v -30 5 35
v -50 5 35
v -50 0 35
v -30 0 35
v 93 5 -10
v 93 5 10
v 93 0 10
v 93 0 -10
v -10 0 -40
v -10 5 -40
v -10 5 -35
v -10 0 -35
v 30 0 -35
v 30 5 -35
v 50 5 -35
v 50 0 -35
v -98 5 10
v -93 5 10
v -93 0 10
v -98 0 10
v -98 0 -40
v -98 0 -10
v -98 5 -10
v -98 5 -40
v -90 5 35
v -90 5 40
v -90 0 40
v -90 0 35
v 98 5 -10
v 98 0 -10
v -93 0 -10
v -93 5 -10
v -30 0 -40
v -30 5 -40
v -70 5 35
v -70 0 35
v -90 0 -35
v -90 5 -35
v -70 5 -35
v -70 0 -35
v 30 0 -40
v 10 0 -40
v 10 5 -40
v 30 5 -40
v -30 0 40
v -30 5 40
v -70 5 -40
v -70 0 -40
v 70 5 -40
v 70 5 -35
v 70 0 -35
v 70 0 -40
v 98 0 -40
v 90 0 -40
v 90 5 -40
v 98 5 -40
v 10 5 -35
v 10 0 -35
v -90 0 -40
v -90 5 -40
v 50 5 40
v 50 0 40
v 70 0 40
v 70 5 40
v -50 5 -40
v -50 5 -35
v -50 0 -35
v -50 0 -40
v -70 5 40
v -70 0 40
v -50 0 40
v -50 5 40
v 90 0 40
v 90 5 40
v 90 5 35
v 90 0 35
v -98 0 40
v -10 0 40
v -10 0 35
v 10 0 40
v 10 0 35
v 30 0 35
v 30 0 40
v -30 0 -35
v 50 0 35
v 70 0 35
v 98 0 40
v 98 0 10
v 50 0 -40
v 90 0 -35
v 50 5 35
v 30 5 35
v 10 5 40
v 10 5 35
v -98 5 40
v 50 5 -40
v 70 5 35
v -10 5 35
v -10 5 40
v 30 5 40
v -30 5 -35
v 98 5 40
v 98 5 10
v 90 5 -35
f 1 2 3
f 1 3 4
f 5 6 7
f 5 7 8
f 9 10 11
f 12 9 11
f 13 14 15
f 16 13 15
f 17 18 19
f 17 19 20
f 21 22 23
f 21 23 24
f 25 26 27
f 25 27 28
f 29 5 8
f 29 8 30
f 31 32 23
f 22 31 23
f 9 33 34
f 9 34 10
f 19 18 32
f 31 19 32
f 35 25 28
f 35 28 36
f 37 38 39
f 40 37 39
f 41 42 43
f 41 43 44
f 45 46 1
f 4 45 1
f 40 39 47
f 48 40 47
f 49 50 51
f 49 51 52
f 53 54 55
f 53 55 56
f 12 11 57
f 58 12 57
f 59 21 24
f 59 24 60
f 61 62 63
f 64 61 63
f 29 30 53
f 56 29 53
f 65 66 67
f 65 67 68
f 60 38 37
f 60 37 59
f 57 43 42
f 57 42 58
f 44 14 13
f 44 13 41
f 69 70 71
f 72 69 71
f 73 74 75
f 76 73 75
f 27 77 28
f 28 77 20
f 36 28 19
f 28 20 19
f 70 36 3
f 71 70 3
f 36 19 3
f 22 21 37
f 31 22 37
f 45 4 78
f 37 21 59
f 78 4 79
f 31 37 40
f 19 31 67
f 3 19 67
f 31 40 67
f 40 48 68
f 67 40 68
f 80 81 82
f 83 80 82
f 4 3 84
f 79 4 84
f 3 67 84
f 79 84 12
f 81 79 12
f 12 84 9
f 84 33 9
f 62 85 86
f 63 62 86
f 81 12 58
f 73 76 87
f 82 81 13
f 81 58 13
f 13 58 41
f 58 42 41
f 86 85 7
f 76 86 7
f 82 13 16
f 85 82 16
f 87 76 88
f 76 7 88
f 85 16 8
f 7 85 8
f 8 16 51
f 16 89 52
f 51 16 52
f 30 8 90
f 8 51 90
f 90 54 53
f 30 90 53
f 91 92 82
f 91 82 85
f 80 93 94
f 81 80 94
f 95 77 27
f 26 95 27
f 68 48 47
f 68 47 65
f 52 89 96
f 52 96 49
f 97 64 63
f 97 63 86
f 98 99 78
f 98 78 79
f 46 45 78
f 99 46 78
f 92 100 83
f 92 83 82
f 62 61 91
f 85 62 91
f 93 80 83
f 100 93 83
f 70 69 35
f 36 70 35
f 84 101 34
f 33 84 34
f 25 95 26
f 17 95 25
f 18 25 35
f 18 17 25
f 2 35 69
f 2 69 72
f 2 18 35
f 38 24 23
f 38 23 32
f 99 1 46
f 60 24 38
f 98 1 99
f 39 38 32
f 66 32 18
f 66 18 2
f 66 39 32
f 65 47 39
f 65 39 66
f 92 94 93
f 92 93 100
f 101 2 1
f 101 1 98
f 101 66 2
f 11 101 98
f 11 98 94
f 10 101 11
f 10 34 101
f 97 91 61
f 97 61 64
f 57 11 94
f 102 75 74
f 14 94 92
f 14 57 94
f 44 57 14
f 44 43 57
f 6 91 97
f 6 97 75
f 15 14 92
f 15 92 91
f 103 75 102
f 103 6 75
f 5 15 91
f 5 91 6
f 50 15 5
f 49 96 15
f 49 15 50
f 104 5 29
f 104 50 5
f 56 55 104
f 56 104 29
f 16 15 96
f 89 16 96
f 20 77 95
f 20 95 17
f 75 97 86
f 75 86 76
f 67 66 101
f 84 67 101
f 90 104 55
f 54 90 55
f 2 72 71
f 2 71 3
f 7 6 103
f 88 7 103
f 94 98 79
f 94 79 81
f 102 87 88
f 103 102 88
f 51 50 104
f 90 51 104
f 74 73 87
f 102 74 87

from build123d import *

# Parameters (mm, degrees)
SKETCH_1_W               = 196
SKETCH_1_H               = 80
EXTRUDE_1_DEPTH          = 5
CUT_EXTRUDE_1_REACH      = 107.967
SKETCH_2_W               = 20
SKETCH_2_H               = 5
PATTERN_LINEAR_1_COUNT   = 3
PATTERN_LINEAR_1_PITCH   = 40
PATTERN_LINEAR_2_COUNT   = 3
PATTERN_LINEAR_2_PITCH   = 40
CUT_EXTRUDE_2_REACH      = 107.967
SKETCH_3_W               = 5
SKETCH_3_H               = 20
MIRROR_2_COPY_1_REACH    = 107.967
MIRROR_2_COPY_1_SKETCH_W = 20
MIRROR_2_COPY_1_SKETCH_H = 5
MIRROR_2_COPY_2_REACH    = 107.967
MIRROR_2_COPY_2_SKETCH_W = 20
MIRROR_2_COPY_2_SKETCH_H = 5
MIRROR_2_COPY_3_REACH    = 107.967
MIRROR_2_COPY_3_SKETCH_W = 20
MIRROR_2_COPY_3_SKETCH_H = 5
MIRROR_2_COPY_4_REACH    = 107.967
MIRROR_2_COPY_4_SKETCH_W = 20
MIRROR_2_COPY_4_SKETCH_H = 5


with BuildPart() as part:
    # 스케치1 → 보스-돌출1 (new body)
    with BuildSketch(Plane(origin=(0, 0, 0), x_dir=(1, 0, 0), z_dir=(0, 1, 0))):
        Rectangle(SKETCH_1_W, SKETCH_1_H)
    extrude(amount=EXTRUDE_1_DEPTH)

    # 스케치2 → 컷-돌출1 (cut, up to next)
    with BuildSketch(Plane(origin=(0, 5, 0), x_dir=(1, 0, 0), z_dir=(0, 1, 0)), mode=Mode.PRIVATE) as cut_extrude_1_sk1:
        with Locations((0, -37.5)):
            Rectangle(SKETCH_2_W, SKETCH_2_H)
    cut_extrude_1_tool1 = extrude(cut_extrude_1_sk1.sketch, amount=-CUT_EXTRUDE_1_REACH, mode=Mode.PRIVATE) & part.part
    cut_extrude_1 = cut_extrude_1_tool1.solids().sort_by_distance((0, 5, 37.5))[0]
    add(cut_extrude_1, mode=Mode.SUBTRACT)

    # 선형 패턴1: 컷-돌출1 ×3
    with Locations(*[(i * PATTERN_LINEAR_1_PITCH, 0, 0) for i in range(1, PATTERN_LINEAR_1_COUNT)]):
        add(cut_extrude_1, mode=Mode.SUBTRACT)

    # 선형 패턴2: 컷-돌출1 ×3
    with Locations(*[(-i * PATTERN_LINEAR_2_PITCH, 0, 0) for i in range(1, PATTERN_LINEAR_2_COUNT)]):
        add(cut_extrude_1, mode=Mode.SUBTRACT)

    # 스케치3 → 컷-돌출2 (cut, up to next)
    with BuildSketch(Plane(origin=(0, 5, 0), x_dir=(1, 0, 0), z_dir=(0, 1, 0)), mode=Mode.PRIVATE) as cut_extrude_2_sk1:
        with Locations((95.5, 0)):
            Rectangle(SKETCH_3_W, SKETCH_3_H)
    cut_extrude_2_tool1 = extrude(cut_extrude_2_sk1.sketch, amount=-CUT_EXTRUDE_2_REACH, mode=Mode.PRIVATE) & part.part
    cut_extrude_2 = cut_extrude_2_tool1.solids().sort_by_distance((95.5, 5, 0))[0]
    add(cut_extrude_2, mode=Mode.SUBTRACT)

    # 대칭 복사2: 컷-돌출1 across plane
    add(cut_extrude_1.mirror(Plane.XY), mode=Mode.SUBTRACT)

    # 대칭 복사2 copy 1 sketch → 대칭 복사2 copy 1 (cut, up to next)
    with BuildSketch(Plane(origin=(40, 5, 0), x_dir=(1, 0, 0), z_dir=(0, 1, 0)), mode=Mode.PRIVATE) as mirror_2_copy_1_sk1:
        with Locations((0, 37.5)):
            Rectangle(MIRROR_2_COPY_1_SKETCH_W, MIRROR_2_COPY_1_SKETCH_H)
    mirror_2_copy_1_tool1 = extrude(mirror_2_copy_1_sk1.sketch, amount=-MIRROR_2_COPY_1_REACH, mode=Mode.PRIVATE) & part.part
    add(mirror_2_copy_1_tool1.solids().sort_by_distance((40, 5, -37.5))[0], mode=Mode.SUBTRACT)

    # 대칭 복사2 copy 2 sketch → 대칭 복사2 copy 2 (cut, up to next)
    with BuildSketch(Plane(origin=(80, 5, 0), x_dir=(1, 0, 0), z_dir=(0, 1, 0)), mode=Mode.PRIVATE) as mirror_2_copy_2_sk1:
        with Locations((0, 37.5)):
            Rectangle(MIRROR_2_COPY_2_SKETCH_W, MIRROR_2_COPY_2_SKETCH_H)
    mirror_2_copy_2_tool1 = extrude(mirror_2_copy_2_sk1.sketch, amount=-MIRROR_2_COPY_2_REACH, mode=Mode.PRIVATE) & part.part
    add(mirror_2_copy_2_tool1.solids().sort_by_distance((80, 5, -37.5))[0], mode=Mode.SUBTRACT)

    # 대칭 복사2 copy 3 sketch → 대칭 복사2 copy 3 (cut, up to next)
    with BuildSketch(Plane(origin=(-40, 5, 0), x_dir=(1, 0, 0), z_dir=(0, 1, 0)), mode=Mode.PRIVATE) as mirror_2_copy_3_sk1:
        with Locations((0, 37.5)):
            Rectangle(MIRROR_2_COPY_3_SKETCH_W, MIRROR_2_COPY_3_SKETCH_H)
    mirror_2_copy_3_tool1 = extrude(mirror_2_copy_3_sk1.sketch, amount=-MIRROR_2_COPY_3_REACH, mode=Mode.PRIVATE) & part.part
    add(mirror_2_copy_3_tool1.solids().sort_by_distance((-40, 5, -37.5))[0], mode=Mode.SUBTRACT)

    # 대칭 복사2 copy 4 sketch → 대칭 복사2 copy 4 (cut, up to next)
    with BuildSketch(Plane(origin=(-80, 5, 0), x_dir=(1, 0, 0), z_dir=(0, 1, 0)), mode=Mode.PRIVATE) as mirror_2_copy_4_sk1:
        with Locations((0, 37.5)):
            Rectangle(MIRROR_2_COPY_4_SKETCH_W, MIRROR_2_COPY_4_SKETCH_H)
    mirror_2_copy_4_tool1 = extrude(mirror_2_copy_4_sk1.sketch, amount=-MIRROR_2_COPY_4_REACH, mode=Mode.PRIVATE) & part.part
    add(mirror_2_copy_4_tool1.solids().sort_by_distance((-80, 5, -37.5))[0], mode=Mode.SUBTRACT)

    # 대칭 복사3: 컷-돌출2 across plane
    add(cut_extrude_2.mirror(Plane(origin=(0, 0, 0), x_dir=(0, 0, 1), z_dir=(1, 0, 0))), mode=Mode.SUBTRACT)


solid = part.part
